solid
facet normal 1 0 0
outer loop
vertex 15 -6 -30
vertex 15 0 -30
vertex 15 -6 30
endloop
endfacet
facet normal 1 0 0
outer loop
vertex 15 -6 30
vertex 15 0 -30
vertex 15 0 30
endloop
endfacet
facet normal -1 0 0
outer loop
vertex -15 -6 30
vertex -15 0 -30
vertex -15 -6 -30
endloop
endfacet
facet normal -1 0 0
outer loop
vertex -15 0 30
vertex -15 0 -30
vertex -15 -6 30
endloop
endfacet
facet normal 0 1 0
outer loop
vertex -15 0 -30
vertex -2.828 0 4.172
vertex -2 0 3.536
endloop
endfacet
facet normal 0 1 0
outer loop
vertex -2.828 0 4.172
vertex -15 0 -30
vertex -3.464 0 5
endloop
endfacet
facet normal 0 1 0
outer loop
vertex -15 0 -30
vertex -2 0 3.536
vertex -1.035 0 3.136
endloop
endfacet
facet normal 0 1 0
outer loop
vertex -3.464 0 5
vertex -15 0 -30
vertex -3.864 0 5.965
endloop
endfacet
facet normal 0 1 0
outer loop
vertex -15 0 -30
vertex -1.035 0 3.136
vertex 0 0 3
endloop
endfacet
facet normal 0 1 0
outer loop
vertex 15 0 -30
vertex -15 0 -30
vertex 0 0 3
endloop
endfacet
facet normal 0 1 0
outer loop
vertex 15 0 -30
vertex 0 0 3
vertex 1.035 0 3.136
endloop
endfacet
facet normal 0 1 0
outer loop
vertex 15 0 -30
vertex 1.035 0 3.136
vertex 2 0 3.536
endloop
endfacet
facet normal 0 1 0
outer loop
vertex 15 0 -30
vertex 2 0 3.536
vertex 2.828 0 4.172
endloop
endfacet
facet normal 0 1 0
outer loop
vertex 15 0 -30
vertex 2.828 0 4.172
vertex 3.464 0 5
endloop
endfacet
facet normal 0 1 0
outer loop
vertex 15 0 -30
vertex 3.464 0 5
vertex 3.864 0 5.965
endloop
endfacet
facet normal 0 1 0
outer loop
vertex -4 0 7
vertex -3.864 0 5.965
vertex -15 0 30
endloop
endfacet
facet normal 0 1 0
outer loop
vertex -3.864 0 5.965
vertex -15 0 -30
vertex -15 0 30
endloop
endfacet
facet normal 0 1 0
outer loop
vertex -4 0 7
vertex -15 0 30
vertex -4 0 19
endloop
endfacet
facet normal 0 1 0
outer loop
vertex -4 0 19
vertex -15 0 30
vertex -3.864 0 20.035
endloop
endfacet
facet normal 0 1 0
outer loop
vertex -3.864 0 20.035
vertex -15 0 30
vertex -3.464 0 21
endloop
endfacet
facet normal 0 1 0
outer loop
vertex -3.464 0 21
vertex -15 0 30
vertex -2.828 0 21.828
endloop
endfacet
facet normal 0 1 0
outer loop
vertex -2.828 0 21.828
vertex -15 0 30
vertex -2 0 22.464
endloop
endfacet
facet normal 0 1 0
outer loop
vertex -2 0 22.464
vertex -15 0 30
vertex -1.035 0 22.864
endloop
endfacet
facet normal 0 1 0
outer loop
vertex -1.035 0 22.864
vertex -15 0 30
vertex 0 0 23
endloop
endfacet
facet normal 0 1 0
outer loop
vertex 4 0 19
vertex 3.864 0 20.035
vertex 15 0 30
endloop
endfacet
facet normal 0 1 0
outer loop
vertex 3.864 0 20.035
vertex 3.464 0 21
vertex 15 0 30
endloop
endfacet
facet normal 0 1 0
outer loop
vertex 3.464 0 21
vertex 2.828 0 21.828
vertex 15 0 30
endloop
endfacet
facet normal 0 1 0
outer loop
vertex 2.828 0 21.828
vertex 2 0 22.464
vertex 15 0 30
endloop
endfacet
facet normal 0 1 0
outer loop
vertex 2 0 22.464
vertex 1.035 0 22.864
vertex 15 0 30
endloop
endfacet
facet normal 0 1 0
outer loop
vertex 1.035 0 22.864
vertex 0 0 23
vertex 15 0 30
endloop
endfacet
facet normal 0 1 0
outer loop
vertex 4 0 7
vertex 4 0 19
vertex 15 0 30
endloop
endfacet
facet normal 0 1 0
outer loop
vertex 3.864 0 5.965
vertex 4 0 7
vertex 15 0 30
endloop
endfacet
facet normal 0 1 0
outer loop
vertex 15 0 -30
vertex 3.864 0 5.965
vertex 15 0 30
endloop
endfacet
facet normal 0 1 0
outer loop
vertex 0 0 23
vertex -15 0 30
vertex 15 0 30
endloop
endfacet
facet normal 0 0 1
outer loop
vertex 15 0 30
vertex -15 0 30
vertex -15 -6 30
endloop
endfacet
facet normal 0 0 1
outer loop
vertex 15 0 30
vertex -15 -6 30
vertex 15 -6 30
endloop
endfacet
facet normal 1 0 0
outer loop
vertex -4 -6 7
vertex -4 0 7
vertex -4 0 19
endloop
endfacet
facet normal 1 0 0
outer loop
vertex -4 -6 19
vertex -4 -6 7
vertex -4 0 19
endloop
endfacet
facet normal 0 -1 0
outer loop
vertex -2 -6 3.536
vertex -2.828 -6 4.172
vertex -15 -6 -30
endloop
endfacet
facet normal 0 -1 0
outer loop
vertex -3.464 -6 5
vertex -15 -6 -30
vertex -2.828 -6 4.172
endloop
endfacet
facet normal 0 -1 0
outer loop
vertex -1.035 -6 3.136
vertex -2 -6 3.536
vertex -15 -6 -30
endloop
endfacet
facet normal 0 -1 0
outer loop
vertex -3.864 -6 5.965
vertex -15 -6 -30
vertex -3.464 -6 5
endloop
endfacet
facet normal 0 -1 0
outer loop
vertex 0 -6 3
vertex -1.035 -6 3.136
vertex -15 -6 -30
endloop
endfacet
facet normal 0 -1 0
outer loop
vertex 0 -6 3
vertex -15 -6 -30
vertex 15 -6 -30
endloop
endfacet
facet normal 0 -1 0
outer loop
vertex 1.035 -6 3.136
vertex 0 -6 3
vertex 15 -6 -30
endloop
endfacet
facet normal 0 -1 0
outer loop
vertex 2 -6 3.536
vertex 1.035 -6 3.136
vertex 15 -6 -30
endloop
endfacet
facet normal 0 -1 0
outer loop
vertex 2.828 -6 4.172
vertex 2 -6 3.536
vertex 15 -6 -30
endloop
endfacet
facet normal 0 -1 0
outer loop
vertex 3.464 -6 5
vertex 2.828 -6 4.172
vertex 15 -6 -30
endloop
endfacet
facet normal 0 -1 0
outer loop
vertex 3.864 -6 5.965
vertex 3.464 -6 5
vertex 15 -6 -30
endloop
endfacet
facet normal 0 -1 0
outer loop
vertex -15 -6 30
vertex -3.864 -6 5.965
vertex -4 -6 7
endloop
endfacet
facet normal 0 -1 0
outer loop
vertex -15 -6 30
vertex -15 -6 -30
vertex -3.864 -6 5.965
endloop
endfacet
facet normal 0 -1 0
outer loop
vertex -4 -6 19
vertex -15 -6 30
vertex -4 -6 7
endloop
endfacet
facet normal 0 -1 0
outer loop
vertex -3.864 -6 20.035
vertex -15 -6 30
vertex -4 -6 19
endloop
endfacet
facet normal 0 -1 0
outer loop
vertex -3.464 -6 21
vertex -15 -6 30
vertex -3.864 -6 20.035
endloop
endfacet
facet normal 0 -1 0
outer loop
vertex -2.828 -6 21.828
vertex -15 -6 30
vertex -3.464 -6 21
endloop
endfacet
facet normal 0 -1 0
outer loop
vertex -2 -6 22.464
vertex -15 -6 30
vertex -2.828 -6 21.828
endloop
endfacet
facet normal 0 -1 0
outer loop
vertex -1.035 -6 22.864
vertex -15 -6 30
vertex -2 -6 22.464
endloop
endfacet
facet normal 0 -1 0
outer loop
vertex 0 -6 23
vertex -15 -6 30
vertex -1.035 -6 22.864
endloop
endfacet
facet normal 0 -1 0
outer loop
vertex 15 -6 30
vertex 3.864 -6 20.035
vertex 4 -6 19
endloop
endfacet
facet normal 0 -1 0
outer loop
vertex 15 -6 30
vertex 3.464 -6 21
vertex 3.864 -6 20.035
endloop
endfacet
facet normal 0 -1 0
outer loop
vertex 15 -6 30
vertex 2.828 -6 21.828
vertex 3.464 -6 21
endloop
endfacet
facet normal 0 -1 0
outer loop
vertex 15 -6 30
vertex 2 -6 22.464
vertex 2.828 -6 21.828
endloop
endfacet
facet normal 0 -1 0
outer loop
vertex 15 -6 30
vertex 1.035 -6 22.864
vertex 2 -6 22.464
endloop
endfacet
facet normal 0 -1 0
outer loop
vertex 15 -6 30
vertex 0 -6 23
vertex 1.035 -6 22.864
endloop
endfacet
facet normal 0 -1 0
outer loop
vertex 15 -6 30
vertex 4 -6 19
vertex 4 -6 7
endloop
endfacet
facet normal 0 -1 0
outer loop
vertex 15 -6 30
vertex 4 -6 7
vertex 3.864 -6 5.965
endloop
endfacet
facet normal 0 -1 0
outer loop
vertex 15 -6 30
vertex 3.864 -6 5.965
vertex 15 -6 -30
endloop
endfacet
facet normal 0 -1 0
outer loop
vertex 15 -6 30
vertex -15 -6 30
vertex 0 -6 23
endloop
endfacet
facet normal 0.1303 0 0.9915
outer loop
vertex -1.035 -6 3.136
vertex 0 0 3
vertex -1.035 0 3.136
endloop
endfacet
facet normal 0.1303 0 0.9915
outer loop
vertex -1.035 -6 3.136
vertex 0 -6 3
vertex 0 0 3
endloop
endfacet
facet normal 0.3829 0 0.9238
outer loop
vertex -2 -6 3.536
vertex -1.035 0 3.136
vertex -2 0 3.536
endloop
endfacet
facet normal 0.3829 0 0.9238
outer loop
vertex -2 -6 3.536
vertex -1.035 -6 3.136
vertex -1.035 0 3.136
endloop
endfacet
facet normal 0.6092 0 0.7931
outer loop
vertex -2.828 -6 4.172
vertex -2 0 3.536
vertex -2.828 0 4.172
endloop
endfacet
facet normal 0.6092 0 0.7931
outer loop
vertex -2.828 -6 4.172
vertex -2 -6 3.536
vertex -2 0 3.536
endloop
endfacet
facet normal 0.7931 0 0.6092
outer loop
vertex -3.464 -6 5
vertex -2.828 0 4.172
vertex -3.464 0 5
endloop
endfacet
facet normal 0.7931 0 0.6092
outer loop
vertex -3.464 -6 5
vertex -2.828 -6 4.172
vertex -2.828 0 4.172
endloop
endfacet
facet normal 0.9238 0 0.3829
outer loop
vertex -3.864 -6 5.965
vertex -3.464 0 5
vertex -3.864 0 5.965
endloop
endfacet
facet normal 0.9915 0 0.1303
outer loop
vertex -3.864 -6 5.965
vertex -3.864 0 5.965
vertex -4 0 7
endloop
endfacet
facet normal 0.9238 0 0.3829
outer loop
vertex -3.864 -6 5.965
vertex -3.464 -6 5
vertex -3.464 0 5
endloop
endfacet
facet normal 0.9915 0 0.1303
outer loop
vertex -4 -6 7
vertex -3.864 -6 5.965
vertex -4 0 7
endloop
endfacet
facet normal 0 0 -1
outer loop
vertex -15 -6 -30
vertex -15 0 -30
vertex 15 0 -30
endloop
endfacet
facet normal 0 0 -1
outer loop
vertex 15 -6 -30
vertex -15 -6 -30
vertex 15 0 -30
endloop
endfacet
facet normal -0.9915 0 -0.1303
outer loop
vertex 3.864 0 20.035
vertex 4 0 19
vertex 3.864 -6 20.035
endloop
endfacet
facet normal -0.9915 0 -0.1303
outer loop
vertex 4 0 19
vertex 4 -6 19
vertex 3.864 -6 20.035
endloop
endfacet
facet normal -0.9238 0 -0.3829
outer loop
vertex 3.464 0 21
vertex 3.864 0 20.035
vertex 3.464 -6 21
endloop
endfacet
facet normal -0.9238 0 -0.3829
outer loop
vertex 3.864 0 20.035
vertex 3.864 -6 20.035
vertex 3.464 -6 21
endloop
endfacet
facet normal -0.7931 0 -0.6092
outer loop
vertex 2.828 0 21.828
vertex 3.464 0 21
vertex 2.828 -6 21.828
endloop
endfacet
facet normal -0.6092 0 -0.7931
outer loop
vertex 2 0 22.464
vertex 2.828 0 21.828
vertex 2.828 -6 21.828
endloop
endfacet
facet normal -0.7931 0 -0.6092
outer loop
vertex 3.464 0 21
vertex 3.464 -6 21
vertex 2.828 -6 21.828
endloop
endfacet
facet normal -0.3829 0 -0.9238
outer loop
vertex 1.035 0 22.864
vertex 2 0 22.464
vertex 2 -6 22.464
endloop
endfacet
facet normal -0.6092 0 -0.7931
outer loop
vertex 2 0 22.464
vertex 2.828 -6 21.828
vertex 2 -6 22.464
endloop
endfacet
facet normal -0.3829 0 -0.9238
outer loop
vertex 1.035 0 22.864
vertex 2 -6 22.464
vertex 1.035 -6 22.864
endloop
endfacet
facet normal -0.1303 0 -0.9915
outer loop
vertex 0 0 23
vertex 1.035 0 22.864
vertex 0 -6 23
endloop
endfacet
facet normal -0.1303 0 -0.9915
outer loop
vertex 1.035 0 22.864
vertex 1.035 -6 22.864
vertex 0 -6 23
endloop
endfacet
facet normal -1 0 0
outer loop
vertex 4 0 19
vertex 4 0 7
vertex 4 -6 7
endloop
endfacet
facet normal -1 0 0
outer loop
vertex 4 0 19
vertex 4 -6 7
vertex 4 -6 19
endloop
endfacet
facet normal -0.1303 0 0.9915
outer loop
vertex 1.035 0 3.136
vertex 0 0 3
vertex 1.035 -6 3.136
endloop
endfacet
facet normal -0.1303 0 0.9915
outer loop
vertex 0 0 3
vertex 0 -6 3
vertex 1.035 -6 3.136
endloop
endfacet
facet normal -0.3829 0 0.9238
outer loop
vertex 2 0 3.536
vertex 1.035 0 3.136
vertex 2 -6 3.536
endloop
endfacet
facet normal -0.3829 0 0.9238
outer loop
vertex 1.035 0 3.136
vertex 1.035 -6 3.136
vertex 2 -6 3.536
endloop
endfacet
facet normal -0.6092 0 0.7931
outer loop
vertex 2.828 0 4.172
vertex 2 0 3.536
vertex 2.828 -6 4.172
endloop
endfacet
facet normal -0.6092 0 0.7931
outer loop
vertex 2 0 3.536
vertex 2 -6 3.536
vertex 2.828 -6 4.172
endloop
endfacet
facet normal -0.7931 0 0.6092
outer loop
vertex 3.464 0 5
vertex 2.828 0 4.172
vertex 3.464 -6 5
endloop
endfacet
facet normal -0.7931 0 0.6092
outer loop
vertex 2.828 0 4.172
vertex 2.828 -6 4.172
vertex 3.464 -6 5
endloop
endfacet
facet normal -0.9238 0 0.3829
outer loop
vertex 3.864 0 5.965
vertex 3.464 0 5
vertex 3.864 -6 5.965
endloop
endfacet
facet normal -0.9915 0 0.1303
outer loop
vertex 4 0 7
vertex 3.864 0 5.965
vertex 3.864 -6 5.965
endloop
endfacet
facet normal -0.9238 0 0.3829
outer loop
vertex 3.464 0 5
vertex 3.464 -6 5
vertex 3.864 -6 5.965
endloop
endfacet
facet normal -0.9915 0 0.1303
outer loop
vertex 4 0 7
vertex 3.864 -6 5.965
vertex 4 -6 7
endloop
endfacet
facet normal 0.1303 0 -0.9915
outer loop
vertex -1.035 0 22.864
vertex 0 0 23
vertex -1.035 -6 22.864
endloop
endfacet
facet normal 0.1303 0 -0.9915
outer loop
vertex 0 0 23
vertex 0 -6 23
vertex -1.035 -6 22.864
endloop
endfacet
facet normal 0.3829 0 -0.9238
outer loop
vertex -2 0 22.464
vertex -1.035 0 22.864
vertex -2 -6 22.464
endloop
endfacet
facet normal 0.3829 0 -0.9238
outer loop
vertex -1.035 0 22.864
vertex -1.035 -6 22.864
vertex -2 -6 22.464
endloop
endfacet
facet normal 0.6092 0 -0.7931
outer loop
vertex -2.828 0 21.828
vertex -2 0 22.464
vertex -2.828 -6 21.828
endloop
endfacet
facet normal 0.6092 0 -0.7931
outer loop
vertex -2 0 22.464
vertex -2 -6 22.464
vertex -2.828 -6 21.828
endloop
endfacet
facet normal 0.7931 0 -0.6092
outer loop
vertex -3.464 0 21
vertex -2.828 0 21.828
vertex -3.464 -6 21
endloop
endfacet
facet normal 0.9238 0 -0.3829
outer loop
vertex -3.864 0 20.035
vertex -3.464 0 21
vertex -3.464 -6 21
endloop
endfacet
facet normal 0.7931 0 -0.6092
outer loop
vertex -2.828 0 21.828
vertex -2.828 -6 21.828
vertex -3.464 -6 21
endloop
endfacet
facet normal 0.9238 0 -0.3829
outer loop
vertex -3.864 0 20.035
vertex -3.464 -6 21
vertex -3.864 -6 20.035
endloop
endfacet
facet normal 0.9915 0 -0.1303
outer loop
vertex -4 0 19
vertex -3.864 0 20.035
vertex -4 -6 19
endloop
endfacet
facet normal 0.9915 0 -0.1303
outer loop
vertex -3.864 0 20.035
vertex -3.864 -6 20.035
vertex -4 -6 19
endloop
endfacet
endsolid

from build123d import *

# Parameters (mm, degrees)
F0_W     = 30
F0_H     = 60
F0_W_2   = 8
F0_H_2   = 20
F1_DEPTH = 6
F2_R     = 3.99999


# Not quite as in the source:
# - a fillet or chamfer is up to 0.001 mm smaller than in the source, because OpenCascade refuses the exact size


with BuildPart() as f1:
    # F0 (on Front) → F1 (new body)
    with BuildSketch(Plane.XZ):
        Rectangle(F0_W, F0_H)
        with Locations((0, 13)):
            Rectangle(F0_W_2, F0_H_2, mode=Mode.SUBTRACT)
    extrude(amount=F1_DEPTH)

    # F2 (radius 4 in the source; OpenCascade refuses exactly that, so slightly less here)
    f2_edges = [f1.edges().sort_by_distance(p)[0] for p in [
        (-4, -3, 23),
        (4, -3, 23),
        (-4, -3, 3),
        (4, -3, 3),
    ]]
    fillet(f2_edges, radius=F2_R)


solid = f1.part
